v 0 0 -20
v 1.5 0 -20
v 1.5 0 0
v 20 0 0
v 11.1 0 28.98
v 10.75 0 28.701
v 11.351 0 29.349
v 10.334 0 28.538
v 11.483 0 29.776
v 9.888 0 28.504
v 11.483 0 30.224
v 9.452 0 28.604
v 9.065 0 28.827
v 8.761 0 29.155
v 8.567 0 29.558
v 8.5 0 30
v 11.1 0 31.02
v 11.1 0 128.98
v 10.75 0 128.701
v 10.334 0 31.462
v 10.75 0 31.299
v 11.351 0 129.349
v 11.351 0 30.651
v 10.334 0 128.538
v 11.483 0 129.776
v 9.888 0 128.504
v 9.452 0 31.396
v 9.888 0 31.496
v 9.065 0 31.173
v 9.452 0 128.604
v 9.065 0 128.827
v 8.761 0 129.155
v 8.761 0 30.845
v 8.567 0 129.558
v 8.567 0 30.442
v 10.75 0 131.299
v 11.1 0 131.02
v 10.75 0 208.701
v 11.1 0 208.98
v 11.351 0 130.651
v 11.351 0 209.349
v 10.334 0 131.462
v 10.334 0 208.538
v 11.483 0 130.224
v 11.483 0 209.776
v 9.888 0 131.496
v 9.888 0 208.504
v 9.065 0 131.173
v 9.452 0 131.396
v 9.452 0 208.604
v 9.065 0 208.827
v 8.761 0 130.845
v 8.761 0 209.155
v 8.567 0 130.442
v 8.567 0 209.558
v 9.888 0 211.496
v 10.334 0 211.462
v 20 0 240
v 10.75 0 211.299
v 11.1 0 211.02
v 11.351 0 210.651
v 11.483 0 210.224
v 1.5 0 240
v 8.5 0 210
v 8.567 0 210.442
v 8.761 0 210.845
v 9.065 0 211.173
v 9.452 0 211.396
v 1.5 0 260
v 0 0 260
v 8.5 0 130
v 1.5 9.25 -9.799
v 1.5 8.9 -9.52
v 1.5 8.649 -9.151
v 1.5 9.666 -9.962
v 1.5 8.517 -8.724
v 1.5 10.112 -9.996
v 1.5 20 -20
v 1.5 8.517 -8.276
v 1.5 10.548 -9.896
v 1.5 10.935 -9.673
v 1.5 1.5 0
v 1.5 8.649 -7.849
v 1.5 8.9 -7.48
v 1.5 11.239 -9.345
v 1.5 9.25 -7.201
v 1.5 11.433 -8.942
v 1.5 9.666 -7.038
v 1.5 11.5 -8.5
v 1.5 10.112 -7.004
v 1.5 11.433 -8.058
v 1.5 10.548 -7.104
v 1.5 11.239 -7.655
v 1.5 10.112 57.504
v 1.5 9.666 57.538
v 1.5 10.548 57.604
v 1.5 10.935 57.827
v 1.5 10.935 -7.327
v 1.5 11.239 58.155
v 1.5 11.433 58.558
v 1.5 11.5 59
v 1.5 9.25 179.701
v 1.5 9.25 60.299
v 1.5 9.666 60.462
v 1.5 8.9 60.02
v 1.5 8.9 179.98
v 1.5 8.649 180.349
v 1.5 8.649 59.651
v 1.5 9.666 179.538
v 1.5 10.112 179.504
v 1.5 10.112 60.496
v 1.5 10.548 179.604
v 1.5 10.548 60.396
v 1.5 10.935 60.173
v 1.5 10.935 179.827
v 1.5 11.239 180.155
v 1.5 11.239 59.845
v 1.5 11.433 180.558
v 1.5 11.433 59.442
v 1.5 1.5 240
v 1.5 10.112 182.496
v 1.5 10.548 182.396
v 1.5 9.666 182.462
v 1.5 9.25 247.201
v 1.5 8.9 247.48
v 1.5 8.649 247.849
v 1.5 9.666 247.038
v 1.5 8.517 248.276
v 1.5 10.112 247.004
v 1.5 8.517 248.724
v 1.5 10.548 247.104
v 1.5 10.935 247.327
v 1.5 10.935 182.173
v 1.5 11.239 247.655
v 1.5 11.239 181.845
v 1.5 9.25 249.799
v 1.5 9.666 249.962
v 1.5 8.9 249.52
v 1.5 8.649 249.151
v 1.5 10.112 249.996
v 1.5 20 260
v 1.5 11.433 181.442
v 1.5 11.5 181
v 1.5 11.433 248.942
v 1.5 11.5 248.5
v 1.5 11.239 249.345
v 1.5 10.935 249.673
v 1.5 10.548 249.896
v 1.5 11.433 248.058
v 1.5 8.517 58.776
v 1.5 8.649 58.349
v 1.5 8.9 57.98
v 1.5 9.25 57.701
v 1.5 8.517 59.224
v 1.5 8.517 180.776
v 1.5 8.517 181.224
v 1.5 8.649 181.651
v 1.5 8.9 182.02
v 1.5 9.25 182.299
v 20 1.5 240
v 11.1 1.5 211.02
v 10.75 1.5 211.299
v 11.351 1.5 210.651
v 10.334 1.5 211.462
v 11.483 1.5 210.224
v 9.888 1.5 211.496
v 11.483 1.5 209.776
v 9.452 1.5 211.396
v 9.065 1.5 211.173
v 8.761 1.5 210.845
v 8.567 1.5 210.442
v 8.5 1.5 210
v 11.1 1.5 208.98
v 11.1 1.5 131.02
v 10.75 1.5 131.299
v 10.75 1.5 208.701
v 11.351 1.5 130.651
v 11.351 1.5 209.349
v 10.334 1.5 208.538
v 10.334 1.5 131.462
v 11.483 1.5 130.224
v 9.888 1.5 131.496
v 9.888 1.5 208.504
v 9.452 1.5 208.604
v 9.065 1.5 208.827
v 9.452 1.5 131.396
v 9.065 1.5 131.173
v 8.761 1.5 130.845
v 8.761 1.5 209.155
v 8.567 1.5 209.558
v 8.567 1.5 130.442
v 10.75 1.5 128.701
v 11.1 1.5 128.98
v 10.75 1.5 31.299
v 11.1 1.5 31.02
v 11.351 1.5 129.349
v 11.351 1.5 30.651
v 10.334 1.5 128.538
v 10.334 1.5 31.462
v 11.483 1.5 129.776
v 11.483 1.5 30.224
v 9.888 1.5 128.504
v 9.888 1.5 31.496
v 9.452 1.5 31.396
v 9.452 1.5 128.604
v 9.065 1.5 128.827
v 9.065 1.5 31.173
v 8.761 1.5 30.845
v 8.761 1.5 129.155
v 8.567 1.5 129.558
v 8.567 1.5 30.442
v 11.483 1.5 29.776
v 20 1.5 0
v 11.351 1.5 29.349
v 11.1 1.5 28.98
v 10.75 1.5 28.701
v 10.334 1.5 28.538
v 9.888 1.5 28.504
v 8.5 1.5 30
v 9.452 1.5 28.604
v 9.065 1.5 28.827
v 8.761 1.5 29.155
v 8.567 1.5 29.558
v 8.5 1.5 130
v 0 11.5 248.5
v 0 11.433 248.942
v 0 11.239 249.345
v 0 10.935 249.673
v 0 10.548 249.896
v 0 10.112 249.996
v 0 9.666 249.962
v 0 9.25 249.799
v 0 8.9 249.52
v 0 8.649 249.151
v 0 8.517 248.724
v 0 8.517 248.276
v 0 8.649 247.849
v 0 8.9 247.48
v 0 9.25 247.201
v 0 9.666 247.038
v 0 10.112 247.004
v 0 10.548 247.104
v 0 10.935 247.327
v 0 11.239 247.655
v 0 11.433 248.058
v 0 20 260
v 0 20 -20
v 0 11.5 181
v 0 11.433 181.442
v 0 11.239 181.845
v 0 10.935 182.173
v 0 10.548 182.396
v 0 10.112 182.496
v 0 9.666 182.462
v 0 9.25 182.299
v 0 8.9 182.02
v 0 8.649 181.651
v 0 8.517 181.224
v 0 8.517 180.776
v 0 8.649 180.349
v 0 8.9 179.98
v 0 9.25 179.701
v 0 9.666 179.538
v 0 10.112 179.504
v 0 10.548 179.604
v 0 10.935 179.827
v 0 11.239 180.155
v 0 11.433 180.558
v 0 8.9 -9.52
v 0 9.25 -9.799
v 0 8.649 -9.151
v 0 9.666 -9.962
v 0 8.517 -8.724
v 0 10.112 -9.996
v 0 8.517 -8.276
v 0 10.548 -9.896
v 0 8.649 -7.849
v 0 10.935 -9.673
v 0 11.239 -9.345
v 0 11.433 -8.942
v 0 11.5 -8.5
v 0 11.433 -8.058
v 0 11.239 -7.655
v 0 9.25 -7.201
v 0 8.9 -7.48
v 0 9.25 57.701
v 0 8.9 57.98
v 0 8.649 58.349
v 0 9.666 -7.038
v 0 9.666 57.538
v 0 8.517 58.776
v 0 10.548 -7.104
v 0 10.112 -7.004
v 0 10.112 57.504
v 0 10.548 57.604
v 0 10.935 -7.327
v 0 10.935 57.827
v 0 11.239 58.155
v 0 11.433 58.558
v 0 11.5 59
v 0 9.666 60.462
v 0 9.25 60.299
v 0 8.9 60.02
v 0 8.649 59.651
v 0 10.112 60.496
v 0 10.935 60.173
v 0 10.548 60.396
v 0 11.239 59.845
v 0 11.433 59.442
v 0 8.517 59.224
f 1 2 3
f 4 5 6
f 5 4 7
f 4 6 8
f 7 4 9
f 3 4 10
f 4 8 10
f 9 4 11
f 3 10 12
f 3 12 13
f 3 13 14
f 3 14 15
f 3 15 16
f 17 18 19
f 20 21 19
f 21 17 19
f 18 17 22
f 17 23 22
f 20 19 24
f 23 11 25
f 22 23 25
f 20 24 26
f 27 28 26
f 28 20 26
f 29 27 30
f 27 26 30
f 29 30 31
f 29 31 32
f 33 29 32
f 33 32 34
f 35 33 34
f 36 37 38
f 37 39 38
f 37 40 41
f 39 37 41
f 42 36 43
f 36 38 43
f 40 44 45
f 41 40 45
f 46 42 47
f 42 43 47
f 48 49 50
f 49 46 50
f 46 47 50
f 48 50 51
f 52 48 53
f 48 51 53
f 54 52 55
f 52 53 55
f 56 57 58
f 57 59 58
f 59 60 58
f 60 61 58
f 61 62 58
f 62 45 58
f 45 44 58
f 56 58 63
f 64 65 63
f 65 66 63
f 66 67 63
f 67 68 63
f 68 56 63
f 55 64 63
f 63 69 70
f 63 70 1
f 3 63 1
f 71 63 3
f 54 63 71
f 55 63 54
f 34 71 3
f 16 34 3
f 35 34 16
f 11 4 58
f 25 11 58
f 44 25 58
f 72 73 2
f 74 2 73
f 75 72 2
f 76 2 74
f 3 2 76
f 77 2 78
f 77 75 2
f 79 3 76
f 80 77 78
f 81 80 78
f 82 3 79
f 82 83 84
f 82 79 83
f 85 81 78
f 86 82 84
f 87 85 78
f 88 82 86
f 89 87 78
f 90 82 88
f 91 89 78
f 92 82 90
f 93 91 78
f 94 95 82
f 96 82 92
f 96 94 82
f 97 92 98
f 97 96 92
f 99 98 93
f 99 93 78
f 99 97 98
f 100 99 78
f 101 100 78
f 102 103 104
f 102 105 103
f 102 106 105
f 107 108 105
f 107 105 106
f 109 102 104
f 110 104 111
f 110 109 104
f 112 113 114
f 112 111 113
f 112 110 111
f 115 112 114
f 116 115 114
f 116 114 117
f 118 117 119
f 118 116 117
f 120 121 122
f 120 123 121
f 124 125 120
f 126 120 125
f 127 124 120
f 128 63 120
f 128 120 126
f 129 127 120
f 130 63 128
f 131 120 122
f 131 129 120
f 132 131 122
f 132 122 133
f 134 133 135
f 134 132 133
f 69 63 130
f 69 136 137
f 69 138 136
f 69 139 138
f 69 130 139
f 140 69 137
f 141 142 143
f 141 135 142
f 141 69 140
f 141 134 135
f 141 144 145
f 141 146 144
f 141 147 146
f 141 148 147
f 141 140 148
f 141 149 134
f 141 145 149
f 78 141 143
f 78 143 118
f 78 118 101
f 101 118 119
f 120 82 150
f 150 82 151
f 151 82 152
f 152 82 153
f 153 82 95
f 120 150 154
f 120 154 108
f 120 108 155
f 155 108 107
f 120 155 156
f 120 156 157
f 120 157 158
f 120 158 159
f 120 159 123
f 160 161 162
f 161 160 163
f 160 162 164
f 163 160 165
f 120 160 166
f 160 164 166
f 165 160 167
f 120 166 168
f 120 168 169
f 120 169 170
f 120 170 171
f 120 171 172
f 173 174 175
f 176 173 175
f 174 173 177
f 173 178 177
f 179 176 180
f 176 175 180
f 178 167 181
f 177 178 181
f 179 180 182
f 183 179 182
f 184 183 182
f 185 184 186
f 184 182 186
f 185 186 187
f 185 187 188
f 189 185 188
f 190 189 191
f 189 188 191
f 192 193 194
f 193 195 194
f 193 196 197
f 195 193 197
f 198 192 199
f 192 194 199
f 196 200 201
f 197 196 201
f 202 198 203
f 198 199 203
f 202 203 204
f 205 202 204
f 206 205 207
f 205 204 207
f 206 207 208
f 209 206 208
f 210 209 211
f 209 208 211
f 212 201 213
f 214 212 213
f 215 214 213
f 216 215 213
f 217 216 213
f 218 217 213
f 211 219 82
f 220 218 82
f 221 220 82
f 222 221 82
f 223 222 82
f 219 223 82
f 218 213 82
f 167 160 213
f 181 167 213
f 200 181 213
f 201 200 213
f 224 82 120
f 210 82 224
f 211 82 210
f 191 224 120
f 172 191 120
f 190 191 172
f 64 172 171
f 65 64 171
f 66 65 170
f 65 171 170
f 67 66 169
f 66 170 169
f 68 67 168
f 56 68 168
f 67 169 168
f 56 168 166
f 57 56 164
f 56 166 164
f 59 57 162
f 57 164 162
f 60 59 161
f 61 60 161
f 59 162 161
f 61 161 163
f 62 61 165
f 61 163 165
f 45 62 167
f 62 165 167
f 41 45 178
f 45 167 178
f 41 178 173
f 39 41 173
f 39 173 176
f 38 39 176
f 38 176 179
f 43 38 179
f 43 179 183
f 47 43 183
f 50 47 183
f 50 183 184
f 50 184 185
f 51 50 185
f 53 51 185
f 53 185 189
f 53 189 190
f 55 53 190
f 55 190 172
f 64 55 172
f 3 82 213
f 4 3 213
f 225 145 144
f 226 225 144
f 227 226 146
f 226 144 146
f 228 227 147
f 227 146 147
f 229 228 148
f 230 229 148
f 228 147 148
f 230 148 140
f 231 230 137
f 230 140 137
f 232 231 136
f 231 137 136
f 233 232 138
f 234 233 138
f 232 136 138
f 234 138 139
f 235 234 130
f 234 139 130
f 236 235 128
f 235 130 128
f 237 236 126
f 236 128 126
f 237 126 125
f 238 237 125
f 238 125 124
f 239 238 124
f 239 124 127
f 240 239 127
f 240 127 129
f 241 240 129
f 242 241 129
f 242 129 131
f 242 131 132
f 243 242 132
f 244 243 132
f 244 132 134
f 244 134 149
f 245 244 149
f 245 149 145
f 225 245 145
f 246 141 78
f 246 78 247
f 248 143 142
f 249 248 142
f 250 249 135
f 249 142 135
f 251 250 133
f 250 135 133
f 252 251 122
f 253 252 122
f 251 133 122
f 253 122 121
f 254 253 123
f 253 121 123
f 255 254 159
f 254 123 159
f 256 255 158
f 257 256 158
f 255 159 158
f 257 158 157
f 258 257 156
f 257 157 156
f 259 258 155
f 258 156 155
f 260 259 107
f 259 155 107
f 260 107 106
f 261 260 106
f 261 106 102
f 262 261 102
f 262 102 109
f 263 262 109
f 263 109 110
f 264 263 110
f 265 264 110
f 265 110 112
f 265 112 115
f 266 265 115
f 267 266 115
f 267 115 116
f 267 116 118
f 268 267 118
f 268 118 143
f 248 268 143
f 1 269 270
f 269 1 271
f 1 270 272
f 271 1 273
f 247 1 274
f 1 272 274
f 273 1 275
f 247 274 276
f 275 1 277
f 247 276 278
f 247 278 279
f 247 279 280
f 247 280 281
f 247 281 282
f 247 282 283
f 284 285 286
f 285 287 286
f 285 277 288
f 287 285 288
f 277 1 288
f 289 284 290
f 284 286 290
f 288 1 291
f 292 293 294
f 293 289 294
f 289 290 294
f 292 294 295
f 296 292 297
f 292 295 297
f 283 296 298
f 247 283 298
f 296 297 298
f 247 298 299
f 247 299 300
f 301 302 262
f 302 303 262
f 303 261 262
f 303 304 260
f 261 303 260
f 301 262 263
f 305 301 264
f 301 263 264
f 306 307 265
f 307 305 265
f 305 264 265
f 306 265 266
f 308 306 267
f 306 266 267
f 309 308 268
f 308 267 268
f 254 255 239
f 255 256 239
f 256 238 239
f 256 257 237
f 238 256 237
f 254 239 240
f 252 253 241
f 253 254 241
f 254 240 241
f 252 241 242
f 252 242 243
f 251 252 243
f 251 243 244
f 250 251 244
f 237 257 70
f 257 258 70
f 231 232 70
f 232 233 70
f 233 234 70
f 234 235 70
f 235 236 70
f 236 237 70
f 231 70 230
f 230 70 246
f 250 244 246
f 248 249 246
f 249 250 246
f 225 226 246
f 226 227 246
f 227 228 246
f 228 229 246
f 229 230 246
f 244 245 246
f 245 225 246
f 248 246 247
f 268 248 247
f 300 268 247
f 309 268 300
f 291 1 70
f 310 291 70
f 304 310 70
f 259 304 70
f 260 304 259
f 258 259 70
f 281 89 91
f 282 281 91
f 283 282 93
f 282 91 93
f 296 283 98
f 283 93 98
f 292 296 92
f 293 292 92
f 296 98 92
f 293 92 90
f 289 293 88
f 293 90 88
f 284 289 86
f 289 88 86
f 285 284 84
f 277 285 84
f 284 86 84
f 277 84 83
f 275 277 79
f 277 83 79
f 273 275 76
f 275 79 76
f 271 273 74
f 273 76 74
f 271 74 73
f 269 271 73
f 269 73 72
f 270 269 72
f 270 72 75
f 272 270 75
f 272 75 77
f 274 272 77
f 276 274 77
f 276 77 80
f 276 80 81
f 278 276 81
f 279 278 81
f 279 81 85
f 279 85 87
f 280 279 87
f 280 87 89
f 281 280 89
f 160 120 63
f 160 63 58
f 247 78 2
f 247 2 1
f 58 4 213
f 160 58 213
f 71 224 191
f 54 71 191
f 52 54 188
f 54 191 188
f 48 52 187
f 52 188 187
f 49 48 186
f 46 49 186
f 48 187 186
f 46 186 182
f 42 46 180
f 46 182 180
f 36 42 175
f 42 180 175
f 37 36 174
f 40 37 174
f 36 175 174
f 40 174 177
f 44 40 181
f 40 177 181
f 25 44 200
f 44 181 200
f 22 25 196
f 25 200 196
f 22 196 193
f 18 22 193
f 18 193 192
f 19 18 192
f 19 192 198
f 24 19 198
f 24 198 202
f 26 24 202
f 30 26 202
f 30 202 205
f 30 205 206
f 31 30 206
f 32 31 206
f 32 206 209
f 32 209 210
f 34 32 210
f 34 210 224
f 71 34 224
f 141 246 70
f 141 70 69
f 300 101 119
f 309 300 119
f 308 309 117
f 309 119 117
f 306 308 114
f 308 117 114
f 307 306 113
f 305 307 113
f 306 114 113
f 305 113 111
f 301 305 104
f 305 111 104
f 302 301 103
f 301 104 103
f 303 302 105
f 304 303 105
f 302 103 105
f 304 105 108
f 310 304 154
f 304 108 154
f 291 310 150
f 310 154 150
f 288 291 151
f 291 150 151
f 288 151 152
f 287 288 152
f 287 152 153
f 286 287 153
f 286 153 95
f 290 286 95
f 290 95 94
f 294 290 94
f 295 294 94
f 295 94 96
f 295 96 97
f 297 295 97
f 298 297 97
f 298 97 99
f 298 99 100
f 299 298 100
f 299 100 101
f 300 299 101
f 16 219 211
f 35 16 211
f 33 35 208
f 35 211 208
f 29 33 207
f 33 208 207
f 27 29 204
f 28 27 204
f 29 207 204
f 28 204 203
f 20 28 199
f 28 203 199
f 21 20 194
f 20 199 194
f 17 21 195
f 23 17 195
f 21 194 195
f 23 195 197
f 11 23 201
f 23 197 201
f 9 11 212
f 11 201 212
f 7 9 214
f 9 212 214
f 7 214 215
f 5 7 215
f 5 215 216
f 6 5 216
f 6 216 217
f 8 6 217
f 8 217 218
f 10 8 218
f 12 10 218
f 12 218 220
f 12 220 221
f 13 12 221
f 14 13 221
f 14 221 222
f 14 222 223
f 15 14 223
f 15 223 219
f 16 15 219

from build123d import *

# Parameters (mm, degrees)
EXTRUSION1_DEPTH = 240
ESQUISSE2_R      = 1.5
EXTRUSION2_DEPTH = 242.541404318
ESQUISSE3_W      = 1.5
ESQUISSE3_H      = 20
EXTRUSION3_DEPTH = 20
ESQUISSE5_W      = 1.5
ESQUISSE5_H      = 20
EXTRUSION4_DEPTH = 20
ESQUISSE6_R      = 1.5
EXTRUSION5_DEPTH = 262.423506977


with BuildPart() as part:
    # Esquisse1 → Extrusion1 (new body)
    with BuildSketch(Plane.XY):
        Polygon((0, 0), (20, 0), (20, 1.5), (1.5, 1.5), (1.5, 20), (0, 20), align=None)
    extrude(amount=EXTRUSION1_DEPTH)

    # Esquisse2 → Extrusion2 (cut, through all)
    with BuildSketch(Plane(origin=(0, 1.5, 0), x_dir=(1, 0, 0), z_dir=(0, 1, 0))):
        with Locations(Location((10, -30, 0), (0, 0, 180))):
            Circle(ESQUISSE2_R)
        with Locations(Location((10, -210, 0), (0, 0, 180))):
            Circle(ESQUISSE2_R)
        with Locations(Location((10, -130, 0), (0, 0, 180))):
            Circle(ESQUISSE2_R)
    extrude(amount=-EXTRUSION2_DEPTH, mode=Mode.SUBTRACT)

    # Esquisse3 → Extrusion3 (add)
    with BuildSketch(Plane.XY.offset(240)):
        with Locations((0.75, 10)):
            Rectangle(ESQUISSE3_W, ESQUISSE3_H)
    extrude(amount=EXTRUSION3_DEPTH)

    # Esquisse5 → Extrusion4 (add)
    with BuildSketch(Plane(origin=(0, 0, 0), x_dir=(-1, 0, 0), z_dir=(0, 0, -1))):
        with Locations((-0.75, 10)):
            Rectangle(ESQUISSE5_W, ESQUISSE5_H)
    extrude(amount=EXTRUSION4_DEPTH)

    # Esquisse6 → Extrusion5 (cut, through all)
    with BuildSketch(Plane(origin=(1.5, 0, 0), x_dir=(0, 0, -1), z_dir=(1, 0, 0))):
        with Locations(Location((-248.5, 10, 0), (0, 0, 90))):
            Circle(ESQUISSE6_R)
        with Locations(Location((8.5, 10, 0), (0, 0, 90))):
            Circle(ESQUISSE6_R)
        with Locations(Location((-181, 10, 0), (0, 0, 90))):
            Circle(ESQUISSE6_R)
        with Locations(Location((-59, 10, 0), (0, 0, 90))):
            Circle(ESQUISSE6_R)
    extrude(amount=-EXTRUSION5_DEPTH, mode=Mode.SUBTRACT)


solid = part.part
